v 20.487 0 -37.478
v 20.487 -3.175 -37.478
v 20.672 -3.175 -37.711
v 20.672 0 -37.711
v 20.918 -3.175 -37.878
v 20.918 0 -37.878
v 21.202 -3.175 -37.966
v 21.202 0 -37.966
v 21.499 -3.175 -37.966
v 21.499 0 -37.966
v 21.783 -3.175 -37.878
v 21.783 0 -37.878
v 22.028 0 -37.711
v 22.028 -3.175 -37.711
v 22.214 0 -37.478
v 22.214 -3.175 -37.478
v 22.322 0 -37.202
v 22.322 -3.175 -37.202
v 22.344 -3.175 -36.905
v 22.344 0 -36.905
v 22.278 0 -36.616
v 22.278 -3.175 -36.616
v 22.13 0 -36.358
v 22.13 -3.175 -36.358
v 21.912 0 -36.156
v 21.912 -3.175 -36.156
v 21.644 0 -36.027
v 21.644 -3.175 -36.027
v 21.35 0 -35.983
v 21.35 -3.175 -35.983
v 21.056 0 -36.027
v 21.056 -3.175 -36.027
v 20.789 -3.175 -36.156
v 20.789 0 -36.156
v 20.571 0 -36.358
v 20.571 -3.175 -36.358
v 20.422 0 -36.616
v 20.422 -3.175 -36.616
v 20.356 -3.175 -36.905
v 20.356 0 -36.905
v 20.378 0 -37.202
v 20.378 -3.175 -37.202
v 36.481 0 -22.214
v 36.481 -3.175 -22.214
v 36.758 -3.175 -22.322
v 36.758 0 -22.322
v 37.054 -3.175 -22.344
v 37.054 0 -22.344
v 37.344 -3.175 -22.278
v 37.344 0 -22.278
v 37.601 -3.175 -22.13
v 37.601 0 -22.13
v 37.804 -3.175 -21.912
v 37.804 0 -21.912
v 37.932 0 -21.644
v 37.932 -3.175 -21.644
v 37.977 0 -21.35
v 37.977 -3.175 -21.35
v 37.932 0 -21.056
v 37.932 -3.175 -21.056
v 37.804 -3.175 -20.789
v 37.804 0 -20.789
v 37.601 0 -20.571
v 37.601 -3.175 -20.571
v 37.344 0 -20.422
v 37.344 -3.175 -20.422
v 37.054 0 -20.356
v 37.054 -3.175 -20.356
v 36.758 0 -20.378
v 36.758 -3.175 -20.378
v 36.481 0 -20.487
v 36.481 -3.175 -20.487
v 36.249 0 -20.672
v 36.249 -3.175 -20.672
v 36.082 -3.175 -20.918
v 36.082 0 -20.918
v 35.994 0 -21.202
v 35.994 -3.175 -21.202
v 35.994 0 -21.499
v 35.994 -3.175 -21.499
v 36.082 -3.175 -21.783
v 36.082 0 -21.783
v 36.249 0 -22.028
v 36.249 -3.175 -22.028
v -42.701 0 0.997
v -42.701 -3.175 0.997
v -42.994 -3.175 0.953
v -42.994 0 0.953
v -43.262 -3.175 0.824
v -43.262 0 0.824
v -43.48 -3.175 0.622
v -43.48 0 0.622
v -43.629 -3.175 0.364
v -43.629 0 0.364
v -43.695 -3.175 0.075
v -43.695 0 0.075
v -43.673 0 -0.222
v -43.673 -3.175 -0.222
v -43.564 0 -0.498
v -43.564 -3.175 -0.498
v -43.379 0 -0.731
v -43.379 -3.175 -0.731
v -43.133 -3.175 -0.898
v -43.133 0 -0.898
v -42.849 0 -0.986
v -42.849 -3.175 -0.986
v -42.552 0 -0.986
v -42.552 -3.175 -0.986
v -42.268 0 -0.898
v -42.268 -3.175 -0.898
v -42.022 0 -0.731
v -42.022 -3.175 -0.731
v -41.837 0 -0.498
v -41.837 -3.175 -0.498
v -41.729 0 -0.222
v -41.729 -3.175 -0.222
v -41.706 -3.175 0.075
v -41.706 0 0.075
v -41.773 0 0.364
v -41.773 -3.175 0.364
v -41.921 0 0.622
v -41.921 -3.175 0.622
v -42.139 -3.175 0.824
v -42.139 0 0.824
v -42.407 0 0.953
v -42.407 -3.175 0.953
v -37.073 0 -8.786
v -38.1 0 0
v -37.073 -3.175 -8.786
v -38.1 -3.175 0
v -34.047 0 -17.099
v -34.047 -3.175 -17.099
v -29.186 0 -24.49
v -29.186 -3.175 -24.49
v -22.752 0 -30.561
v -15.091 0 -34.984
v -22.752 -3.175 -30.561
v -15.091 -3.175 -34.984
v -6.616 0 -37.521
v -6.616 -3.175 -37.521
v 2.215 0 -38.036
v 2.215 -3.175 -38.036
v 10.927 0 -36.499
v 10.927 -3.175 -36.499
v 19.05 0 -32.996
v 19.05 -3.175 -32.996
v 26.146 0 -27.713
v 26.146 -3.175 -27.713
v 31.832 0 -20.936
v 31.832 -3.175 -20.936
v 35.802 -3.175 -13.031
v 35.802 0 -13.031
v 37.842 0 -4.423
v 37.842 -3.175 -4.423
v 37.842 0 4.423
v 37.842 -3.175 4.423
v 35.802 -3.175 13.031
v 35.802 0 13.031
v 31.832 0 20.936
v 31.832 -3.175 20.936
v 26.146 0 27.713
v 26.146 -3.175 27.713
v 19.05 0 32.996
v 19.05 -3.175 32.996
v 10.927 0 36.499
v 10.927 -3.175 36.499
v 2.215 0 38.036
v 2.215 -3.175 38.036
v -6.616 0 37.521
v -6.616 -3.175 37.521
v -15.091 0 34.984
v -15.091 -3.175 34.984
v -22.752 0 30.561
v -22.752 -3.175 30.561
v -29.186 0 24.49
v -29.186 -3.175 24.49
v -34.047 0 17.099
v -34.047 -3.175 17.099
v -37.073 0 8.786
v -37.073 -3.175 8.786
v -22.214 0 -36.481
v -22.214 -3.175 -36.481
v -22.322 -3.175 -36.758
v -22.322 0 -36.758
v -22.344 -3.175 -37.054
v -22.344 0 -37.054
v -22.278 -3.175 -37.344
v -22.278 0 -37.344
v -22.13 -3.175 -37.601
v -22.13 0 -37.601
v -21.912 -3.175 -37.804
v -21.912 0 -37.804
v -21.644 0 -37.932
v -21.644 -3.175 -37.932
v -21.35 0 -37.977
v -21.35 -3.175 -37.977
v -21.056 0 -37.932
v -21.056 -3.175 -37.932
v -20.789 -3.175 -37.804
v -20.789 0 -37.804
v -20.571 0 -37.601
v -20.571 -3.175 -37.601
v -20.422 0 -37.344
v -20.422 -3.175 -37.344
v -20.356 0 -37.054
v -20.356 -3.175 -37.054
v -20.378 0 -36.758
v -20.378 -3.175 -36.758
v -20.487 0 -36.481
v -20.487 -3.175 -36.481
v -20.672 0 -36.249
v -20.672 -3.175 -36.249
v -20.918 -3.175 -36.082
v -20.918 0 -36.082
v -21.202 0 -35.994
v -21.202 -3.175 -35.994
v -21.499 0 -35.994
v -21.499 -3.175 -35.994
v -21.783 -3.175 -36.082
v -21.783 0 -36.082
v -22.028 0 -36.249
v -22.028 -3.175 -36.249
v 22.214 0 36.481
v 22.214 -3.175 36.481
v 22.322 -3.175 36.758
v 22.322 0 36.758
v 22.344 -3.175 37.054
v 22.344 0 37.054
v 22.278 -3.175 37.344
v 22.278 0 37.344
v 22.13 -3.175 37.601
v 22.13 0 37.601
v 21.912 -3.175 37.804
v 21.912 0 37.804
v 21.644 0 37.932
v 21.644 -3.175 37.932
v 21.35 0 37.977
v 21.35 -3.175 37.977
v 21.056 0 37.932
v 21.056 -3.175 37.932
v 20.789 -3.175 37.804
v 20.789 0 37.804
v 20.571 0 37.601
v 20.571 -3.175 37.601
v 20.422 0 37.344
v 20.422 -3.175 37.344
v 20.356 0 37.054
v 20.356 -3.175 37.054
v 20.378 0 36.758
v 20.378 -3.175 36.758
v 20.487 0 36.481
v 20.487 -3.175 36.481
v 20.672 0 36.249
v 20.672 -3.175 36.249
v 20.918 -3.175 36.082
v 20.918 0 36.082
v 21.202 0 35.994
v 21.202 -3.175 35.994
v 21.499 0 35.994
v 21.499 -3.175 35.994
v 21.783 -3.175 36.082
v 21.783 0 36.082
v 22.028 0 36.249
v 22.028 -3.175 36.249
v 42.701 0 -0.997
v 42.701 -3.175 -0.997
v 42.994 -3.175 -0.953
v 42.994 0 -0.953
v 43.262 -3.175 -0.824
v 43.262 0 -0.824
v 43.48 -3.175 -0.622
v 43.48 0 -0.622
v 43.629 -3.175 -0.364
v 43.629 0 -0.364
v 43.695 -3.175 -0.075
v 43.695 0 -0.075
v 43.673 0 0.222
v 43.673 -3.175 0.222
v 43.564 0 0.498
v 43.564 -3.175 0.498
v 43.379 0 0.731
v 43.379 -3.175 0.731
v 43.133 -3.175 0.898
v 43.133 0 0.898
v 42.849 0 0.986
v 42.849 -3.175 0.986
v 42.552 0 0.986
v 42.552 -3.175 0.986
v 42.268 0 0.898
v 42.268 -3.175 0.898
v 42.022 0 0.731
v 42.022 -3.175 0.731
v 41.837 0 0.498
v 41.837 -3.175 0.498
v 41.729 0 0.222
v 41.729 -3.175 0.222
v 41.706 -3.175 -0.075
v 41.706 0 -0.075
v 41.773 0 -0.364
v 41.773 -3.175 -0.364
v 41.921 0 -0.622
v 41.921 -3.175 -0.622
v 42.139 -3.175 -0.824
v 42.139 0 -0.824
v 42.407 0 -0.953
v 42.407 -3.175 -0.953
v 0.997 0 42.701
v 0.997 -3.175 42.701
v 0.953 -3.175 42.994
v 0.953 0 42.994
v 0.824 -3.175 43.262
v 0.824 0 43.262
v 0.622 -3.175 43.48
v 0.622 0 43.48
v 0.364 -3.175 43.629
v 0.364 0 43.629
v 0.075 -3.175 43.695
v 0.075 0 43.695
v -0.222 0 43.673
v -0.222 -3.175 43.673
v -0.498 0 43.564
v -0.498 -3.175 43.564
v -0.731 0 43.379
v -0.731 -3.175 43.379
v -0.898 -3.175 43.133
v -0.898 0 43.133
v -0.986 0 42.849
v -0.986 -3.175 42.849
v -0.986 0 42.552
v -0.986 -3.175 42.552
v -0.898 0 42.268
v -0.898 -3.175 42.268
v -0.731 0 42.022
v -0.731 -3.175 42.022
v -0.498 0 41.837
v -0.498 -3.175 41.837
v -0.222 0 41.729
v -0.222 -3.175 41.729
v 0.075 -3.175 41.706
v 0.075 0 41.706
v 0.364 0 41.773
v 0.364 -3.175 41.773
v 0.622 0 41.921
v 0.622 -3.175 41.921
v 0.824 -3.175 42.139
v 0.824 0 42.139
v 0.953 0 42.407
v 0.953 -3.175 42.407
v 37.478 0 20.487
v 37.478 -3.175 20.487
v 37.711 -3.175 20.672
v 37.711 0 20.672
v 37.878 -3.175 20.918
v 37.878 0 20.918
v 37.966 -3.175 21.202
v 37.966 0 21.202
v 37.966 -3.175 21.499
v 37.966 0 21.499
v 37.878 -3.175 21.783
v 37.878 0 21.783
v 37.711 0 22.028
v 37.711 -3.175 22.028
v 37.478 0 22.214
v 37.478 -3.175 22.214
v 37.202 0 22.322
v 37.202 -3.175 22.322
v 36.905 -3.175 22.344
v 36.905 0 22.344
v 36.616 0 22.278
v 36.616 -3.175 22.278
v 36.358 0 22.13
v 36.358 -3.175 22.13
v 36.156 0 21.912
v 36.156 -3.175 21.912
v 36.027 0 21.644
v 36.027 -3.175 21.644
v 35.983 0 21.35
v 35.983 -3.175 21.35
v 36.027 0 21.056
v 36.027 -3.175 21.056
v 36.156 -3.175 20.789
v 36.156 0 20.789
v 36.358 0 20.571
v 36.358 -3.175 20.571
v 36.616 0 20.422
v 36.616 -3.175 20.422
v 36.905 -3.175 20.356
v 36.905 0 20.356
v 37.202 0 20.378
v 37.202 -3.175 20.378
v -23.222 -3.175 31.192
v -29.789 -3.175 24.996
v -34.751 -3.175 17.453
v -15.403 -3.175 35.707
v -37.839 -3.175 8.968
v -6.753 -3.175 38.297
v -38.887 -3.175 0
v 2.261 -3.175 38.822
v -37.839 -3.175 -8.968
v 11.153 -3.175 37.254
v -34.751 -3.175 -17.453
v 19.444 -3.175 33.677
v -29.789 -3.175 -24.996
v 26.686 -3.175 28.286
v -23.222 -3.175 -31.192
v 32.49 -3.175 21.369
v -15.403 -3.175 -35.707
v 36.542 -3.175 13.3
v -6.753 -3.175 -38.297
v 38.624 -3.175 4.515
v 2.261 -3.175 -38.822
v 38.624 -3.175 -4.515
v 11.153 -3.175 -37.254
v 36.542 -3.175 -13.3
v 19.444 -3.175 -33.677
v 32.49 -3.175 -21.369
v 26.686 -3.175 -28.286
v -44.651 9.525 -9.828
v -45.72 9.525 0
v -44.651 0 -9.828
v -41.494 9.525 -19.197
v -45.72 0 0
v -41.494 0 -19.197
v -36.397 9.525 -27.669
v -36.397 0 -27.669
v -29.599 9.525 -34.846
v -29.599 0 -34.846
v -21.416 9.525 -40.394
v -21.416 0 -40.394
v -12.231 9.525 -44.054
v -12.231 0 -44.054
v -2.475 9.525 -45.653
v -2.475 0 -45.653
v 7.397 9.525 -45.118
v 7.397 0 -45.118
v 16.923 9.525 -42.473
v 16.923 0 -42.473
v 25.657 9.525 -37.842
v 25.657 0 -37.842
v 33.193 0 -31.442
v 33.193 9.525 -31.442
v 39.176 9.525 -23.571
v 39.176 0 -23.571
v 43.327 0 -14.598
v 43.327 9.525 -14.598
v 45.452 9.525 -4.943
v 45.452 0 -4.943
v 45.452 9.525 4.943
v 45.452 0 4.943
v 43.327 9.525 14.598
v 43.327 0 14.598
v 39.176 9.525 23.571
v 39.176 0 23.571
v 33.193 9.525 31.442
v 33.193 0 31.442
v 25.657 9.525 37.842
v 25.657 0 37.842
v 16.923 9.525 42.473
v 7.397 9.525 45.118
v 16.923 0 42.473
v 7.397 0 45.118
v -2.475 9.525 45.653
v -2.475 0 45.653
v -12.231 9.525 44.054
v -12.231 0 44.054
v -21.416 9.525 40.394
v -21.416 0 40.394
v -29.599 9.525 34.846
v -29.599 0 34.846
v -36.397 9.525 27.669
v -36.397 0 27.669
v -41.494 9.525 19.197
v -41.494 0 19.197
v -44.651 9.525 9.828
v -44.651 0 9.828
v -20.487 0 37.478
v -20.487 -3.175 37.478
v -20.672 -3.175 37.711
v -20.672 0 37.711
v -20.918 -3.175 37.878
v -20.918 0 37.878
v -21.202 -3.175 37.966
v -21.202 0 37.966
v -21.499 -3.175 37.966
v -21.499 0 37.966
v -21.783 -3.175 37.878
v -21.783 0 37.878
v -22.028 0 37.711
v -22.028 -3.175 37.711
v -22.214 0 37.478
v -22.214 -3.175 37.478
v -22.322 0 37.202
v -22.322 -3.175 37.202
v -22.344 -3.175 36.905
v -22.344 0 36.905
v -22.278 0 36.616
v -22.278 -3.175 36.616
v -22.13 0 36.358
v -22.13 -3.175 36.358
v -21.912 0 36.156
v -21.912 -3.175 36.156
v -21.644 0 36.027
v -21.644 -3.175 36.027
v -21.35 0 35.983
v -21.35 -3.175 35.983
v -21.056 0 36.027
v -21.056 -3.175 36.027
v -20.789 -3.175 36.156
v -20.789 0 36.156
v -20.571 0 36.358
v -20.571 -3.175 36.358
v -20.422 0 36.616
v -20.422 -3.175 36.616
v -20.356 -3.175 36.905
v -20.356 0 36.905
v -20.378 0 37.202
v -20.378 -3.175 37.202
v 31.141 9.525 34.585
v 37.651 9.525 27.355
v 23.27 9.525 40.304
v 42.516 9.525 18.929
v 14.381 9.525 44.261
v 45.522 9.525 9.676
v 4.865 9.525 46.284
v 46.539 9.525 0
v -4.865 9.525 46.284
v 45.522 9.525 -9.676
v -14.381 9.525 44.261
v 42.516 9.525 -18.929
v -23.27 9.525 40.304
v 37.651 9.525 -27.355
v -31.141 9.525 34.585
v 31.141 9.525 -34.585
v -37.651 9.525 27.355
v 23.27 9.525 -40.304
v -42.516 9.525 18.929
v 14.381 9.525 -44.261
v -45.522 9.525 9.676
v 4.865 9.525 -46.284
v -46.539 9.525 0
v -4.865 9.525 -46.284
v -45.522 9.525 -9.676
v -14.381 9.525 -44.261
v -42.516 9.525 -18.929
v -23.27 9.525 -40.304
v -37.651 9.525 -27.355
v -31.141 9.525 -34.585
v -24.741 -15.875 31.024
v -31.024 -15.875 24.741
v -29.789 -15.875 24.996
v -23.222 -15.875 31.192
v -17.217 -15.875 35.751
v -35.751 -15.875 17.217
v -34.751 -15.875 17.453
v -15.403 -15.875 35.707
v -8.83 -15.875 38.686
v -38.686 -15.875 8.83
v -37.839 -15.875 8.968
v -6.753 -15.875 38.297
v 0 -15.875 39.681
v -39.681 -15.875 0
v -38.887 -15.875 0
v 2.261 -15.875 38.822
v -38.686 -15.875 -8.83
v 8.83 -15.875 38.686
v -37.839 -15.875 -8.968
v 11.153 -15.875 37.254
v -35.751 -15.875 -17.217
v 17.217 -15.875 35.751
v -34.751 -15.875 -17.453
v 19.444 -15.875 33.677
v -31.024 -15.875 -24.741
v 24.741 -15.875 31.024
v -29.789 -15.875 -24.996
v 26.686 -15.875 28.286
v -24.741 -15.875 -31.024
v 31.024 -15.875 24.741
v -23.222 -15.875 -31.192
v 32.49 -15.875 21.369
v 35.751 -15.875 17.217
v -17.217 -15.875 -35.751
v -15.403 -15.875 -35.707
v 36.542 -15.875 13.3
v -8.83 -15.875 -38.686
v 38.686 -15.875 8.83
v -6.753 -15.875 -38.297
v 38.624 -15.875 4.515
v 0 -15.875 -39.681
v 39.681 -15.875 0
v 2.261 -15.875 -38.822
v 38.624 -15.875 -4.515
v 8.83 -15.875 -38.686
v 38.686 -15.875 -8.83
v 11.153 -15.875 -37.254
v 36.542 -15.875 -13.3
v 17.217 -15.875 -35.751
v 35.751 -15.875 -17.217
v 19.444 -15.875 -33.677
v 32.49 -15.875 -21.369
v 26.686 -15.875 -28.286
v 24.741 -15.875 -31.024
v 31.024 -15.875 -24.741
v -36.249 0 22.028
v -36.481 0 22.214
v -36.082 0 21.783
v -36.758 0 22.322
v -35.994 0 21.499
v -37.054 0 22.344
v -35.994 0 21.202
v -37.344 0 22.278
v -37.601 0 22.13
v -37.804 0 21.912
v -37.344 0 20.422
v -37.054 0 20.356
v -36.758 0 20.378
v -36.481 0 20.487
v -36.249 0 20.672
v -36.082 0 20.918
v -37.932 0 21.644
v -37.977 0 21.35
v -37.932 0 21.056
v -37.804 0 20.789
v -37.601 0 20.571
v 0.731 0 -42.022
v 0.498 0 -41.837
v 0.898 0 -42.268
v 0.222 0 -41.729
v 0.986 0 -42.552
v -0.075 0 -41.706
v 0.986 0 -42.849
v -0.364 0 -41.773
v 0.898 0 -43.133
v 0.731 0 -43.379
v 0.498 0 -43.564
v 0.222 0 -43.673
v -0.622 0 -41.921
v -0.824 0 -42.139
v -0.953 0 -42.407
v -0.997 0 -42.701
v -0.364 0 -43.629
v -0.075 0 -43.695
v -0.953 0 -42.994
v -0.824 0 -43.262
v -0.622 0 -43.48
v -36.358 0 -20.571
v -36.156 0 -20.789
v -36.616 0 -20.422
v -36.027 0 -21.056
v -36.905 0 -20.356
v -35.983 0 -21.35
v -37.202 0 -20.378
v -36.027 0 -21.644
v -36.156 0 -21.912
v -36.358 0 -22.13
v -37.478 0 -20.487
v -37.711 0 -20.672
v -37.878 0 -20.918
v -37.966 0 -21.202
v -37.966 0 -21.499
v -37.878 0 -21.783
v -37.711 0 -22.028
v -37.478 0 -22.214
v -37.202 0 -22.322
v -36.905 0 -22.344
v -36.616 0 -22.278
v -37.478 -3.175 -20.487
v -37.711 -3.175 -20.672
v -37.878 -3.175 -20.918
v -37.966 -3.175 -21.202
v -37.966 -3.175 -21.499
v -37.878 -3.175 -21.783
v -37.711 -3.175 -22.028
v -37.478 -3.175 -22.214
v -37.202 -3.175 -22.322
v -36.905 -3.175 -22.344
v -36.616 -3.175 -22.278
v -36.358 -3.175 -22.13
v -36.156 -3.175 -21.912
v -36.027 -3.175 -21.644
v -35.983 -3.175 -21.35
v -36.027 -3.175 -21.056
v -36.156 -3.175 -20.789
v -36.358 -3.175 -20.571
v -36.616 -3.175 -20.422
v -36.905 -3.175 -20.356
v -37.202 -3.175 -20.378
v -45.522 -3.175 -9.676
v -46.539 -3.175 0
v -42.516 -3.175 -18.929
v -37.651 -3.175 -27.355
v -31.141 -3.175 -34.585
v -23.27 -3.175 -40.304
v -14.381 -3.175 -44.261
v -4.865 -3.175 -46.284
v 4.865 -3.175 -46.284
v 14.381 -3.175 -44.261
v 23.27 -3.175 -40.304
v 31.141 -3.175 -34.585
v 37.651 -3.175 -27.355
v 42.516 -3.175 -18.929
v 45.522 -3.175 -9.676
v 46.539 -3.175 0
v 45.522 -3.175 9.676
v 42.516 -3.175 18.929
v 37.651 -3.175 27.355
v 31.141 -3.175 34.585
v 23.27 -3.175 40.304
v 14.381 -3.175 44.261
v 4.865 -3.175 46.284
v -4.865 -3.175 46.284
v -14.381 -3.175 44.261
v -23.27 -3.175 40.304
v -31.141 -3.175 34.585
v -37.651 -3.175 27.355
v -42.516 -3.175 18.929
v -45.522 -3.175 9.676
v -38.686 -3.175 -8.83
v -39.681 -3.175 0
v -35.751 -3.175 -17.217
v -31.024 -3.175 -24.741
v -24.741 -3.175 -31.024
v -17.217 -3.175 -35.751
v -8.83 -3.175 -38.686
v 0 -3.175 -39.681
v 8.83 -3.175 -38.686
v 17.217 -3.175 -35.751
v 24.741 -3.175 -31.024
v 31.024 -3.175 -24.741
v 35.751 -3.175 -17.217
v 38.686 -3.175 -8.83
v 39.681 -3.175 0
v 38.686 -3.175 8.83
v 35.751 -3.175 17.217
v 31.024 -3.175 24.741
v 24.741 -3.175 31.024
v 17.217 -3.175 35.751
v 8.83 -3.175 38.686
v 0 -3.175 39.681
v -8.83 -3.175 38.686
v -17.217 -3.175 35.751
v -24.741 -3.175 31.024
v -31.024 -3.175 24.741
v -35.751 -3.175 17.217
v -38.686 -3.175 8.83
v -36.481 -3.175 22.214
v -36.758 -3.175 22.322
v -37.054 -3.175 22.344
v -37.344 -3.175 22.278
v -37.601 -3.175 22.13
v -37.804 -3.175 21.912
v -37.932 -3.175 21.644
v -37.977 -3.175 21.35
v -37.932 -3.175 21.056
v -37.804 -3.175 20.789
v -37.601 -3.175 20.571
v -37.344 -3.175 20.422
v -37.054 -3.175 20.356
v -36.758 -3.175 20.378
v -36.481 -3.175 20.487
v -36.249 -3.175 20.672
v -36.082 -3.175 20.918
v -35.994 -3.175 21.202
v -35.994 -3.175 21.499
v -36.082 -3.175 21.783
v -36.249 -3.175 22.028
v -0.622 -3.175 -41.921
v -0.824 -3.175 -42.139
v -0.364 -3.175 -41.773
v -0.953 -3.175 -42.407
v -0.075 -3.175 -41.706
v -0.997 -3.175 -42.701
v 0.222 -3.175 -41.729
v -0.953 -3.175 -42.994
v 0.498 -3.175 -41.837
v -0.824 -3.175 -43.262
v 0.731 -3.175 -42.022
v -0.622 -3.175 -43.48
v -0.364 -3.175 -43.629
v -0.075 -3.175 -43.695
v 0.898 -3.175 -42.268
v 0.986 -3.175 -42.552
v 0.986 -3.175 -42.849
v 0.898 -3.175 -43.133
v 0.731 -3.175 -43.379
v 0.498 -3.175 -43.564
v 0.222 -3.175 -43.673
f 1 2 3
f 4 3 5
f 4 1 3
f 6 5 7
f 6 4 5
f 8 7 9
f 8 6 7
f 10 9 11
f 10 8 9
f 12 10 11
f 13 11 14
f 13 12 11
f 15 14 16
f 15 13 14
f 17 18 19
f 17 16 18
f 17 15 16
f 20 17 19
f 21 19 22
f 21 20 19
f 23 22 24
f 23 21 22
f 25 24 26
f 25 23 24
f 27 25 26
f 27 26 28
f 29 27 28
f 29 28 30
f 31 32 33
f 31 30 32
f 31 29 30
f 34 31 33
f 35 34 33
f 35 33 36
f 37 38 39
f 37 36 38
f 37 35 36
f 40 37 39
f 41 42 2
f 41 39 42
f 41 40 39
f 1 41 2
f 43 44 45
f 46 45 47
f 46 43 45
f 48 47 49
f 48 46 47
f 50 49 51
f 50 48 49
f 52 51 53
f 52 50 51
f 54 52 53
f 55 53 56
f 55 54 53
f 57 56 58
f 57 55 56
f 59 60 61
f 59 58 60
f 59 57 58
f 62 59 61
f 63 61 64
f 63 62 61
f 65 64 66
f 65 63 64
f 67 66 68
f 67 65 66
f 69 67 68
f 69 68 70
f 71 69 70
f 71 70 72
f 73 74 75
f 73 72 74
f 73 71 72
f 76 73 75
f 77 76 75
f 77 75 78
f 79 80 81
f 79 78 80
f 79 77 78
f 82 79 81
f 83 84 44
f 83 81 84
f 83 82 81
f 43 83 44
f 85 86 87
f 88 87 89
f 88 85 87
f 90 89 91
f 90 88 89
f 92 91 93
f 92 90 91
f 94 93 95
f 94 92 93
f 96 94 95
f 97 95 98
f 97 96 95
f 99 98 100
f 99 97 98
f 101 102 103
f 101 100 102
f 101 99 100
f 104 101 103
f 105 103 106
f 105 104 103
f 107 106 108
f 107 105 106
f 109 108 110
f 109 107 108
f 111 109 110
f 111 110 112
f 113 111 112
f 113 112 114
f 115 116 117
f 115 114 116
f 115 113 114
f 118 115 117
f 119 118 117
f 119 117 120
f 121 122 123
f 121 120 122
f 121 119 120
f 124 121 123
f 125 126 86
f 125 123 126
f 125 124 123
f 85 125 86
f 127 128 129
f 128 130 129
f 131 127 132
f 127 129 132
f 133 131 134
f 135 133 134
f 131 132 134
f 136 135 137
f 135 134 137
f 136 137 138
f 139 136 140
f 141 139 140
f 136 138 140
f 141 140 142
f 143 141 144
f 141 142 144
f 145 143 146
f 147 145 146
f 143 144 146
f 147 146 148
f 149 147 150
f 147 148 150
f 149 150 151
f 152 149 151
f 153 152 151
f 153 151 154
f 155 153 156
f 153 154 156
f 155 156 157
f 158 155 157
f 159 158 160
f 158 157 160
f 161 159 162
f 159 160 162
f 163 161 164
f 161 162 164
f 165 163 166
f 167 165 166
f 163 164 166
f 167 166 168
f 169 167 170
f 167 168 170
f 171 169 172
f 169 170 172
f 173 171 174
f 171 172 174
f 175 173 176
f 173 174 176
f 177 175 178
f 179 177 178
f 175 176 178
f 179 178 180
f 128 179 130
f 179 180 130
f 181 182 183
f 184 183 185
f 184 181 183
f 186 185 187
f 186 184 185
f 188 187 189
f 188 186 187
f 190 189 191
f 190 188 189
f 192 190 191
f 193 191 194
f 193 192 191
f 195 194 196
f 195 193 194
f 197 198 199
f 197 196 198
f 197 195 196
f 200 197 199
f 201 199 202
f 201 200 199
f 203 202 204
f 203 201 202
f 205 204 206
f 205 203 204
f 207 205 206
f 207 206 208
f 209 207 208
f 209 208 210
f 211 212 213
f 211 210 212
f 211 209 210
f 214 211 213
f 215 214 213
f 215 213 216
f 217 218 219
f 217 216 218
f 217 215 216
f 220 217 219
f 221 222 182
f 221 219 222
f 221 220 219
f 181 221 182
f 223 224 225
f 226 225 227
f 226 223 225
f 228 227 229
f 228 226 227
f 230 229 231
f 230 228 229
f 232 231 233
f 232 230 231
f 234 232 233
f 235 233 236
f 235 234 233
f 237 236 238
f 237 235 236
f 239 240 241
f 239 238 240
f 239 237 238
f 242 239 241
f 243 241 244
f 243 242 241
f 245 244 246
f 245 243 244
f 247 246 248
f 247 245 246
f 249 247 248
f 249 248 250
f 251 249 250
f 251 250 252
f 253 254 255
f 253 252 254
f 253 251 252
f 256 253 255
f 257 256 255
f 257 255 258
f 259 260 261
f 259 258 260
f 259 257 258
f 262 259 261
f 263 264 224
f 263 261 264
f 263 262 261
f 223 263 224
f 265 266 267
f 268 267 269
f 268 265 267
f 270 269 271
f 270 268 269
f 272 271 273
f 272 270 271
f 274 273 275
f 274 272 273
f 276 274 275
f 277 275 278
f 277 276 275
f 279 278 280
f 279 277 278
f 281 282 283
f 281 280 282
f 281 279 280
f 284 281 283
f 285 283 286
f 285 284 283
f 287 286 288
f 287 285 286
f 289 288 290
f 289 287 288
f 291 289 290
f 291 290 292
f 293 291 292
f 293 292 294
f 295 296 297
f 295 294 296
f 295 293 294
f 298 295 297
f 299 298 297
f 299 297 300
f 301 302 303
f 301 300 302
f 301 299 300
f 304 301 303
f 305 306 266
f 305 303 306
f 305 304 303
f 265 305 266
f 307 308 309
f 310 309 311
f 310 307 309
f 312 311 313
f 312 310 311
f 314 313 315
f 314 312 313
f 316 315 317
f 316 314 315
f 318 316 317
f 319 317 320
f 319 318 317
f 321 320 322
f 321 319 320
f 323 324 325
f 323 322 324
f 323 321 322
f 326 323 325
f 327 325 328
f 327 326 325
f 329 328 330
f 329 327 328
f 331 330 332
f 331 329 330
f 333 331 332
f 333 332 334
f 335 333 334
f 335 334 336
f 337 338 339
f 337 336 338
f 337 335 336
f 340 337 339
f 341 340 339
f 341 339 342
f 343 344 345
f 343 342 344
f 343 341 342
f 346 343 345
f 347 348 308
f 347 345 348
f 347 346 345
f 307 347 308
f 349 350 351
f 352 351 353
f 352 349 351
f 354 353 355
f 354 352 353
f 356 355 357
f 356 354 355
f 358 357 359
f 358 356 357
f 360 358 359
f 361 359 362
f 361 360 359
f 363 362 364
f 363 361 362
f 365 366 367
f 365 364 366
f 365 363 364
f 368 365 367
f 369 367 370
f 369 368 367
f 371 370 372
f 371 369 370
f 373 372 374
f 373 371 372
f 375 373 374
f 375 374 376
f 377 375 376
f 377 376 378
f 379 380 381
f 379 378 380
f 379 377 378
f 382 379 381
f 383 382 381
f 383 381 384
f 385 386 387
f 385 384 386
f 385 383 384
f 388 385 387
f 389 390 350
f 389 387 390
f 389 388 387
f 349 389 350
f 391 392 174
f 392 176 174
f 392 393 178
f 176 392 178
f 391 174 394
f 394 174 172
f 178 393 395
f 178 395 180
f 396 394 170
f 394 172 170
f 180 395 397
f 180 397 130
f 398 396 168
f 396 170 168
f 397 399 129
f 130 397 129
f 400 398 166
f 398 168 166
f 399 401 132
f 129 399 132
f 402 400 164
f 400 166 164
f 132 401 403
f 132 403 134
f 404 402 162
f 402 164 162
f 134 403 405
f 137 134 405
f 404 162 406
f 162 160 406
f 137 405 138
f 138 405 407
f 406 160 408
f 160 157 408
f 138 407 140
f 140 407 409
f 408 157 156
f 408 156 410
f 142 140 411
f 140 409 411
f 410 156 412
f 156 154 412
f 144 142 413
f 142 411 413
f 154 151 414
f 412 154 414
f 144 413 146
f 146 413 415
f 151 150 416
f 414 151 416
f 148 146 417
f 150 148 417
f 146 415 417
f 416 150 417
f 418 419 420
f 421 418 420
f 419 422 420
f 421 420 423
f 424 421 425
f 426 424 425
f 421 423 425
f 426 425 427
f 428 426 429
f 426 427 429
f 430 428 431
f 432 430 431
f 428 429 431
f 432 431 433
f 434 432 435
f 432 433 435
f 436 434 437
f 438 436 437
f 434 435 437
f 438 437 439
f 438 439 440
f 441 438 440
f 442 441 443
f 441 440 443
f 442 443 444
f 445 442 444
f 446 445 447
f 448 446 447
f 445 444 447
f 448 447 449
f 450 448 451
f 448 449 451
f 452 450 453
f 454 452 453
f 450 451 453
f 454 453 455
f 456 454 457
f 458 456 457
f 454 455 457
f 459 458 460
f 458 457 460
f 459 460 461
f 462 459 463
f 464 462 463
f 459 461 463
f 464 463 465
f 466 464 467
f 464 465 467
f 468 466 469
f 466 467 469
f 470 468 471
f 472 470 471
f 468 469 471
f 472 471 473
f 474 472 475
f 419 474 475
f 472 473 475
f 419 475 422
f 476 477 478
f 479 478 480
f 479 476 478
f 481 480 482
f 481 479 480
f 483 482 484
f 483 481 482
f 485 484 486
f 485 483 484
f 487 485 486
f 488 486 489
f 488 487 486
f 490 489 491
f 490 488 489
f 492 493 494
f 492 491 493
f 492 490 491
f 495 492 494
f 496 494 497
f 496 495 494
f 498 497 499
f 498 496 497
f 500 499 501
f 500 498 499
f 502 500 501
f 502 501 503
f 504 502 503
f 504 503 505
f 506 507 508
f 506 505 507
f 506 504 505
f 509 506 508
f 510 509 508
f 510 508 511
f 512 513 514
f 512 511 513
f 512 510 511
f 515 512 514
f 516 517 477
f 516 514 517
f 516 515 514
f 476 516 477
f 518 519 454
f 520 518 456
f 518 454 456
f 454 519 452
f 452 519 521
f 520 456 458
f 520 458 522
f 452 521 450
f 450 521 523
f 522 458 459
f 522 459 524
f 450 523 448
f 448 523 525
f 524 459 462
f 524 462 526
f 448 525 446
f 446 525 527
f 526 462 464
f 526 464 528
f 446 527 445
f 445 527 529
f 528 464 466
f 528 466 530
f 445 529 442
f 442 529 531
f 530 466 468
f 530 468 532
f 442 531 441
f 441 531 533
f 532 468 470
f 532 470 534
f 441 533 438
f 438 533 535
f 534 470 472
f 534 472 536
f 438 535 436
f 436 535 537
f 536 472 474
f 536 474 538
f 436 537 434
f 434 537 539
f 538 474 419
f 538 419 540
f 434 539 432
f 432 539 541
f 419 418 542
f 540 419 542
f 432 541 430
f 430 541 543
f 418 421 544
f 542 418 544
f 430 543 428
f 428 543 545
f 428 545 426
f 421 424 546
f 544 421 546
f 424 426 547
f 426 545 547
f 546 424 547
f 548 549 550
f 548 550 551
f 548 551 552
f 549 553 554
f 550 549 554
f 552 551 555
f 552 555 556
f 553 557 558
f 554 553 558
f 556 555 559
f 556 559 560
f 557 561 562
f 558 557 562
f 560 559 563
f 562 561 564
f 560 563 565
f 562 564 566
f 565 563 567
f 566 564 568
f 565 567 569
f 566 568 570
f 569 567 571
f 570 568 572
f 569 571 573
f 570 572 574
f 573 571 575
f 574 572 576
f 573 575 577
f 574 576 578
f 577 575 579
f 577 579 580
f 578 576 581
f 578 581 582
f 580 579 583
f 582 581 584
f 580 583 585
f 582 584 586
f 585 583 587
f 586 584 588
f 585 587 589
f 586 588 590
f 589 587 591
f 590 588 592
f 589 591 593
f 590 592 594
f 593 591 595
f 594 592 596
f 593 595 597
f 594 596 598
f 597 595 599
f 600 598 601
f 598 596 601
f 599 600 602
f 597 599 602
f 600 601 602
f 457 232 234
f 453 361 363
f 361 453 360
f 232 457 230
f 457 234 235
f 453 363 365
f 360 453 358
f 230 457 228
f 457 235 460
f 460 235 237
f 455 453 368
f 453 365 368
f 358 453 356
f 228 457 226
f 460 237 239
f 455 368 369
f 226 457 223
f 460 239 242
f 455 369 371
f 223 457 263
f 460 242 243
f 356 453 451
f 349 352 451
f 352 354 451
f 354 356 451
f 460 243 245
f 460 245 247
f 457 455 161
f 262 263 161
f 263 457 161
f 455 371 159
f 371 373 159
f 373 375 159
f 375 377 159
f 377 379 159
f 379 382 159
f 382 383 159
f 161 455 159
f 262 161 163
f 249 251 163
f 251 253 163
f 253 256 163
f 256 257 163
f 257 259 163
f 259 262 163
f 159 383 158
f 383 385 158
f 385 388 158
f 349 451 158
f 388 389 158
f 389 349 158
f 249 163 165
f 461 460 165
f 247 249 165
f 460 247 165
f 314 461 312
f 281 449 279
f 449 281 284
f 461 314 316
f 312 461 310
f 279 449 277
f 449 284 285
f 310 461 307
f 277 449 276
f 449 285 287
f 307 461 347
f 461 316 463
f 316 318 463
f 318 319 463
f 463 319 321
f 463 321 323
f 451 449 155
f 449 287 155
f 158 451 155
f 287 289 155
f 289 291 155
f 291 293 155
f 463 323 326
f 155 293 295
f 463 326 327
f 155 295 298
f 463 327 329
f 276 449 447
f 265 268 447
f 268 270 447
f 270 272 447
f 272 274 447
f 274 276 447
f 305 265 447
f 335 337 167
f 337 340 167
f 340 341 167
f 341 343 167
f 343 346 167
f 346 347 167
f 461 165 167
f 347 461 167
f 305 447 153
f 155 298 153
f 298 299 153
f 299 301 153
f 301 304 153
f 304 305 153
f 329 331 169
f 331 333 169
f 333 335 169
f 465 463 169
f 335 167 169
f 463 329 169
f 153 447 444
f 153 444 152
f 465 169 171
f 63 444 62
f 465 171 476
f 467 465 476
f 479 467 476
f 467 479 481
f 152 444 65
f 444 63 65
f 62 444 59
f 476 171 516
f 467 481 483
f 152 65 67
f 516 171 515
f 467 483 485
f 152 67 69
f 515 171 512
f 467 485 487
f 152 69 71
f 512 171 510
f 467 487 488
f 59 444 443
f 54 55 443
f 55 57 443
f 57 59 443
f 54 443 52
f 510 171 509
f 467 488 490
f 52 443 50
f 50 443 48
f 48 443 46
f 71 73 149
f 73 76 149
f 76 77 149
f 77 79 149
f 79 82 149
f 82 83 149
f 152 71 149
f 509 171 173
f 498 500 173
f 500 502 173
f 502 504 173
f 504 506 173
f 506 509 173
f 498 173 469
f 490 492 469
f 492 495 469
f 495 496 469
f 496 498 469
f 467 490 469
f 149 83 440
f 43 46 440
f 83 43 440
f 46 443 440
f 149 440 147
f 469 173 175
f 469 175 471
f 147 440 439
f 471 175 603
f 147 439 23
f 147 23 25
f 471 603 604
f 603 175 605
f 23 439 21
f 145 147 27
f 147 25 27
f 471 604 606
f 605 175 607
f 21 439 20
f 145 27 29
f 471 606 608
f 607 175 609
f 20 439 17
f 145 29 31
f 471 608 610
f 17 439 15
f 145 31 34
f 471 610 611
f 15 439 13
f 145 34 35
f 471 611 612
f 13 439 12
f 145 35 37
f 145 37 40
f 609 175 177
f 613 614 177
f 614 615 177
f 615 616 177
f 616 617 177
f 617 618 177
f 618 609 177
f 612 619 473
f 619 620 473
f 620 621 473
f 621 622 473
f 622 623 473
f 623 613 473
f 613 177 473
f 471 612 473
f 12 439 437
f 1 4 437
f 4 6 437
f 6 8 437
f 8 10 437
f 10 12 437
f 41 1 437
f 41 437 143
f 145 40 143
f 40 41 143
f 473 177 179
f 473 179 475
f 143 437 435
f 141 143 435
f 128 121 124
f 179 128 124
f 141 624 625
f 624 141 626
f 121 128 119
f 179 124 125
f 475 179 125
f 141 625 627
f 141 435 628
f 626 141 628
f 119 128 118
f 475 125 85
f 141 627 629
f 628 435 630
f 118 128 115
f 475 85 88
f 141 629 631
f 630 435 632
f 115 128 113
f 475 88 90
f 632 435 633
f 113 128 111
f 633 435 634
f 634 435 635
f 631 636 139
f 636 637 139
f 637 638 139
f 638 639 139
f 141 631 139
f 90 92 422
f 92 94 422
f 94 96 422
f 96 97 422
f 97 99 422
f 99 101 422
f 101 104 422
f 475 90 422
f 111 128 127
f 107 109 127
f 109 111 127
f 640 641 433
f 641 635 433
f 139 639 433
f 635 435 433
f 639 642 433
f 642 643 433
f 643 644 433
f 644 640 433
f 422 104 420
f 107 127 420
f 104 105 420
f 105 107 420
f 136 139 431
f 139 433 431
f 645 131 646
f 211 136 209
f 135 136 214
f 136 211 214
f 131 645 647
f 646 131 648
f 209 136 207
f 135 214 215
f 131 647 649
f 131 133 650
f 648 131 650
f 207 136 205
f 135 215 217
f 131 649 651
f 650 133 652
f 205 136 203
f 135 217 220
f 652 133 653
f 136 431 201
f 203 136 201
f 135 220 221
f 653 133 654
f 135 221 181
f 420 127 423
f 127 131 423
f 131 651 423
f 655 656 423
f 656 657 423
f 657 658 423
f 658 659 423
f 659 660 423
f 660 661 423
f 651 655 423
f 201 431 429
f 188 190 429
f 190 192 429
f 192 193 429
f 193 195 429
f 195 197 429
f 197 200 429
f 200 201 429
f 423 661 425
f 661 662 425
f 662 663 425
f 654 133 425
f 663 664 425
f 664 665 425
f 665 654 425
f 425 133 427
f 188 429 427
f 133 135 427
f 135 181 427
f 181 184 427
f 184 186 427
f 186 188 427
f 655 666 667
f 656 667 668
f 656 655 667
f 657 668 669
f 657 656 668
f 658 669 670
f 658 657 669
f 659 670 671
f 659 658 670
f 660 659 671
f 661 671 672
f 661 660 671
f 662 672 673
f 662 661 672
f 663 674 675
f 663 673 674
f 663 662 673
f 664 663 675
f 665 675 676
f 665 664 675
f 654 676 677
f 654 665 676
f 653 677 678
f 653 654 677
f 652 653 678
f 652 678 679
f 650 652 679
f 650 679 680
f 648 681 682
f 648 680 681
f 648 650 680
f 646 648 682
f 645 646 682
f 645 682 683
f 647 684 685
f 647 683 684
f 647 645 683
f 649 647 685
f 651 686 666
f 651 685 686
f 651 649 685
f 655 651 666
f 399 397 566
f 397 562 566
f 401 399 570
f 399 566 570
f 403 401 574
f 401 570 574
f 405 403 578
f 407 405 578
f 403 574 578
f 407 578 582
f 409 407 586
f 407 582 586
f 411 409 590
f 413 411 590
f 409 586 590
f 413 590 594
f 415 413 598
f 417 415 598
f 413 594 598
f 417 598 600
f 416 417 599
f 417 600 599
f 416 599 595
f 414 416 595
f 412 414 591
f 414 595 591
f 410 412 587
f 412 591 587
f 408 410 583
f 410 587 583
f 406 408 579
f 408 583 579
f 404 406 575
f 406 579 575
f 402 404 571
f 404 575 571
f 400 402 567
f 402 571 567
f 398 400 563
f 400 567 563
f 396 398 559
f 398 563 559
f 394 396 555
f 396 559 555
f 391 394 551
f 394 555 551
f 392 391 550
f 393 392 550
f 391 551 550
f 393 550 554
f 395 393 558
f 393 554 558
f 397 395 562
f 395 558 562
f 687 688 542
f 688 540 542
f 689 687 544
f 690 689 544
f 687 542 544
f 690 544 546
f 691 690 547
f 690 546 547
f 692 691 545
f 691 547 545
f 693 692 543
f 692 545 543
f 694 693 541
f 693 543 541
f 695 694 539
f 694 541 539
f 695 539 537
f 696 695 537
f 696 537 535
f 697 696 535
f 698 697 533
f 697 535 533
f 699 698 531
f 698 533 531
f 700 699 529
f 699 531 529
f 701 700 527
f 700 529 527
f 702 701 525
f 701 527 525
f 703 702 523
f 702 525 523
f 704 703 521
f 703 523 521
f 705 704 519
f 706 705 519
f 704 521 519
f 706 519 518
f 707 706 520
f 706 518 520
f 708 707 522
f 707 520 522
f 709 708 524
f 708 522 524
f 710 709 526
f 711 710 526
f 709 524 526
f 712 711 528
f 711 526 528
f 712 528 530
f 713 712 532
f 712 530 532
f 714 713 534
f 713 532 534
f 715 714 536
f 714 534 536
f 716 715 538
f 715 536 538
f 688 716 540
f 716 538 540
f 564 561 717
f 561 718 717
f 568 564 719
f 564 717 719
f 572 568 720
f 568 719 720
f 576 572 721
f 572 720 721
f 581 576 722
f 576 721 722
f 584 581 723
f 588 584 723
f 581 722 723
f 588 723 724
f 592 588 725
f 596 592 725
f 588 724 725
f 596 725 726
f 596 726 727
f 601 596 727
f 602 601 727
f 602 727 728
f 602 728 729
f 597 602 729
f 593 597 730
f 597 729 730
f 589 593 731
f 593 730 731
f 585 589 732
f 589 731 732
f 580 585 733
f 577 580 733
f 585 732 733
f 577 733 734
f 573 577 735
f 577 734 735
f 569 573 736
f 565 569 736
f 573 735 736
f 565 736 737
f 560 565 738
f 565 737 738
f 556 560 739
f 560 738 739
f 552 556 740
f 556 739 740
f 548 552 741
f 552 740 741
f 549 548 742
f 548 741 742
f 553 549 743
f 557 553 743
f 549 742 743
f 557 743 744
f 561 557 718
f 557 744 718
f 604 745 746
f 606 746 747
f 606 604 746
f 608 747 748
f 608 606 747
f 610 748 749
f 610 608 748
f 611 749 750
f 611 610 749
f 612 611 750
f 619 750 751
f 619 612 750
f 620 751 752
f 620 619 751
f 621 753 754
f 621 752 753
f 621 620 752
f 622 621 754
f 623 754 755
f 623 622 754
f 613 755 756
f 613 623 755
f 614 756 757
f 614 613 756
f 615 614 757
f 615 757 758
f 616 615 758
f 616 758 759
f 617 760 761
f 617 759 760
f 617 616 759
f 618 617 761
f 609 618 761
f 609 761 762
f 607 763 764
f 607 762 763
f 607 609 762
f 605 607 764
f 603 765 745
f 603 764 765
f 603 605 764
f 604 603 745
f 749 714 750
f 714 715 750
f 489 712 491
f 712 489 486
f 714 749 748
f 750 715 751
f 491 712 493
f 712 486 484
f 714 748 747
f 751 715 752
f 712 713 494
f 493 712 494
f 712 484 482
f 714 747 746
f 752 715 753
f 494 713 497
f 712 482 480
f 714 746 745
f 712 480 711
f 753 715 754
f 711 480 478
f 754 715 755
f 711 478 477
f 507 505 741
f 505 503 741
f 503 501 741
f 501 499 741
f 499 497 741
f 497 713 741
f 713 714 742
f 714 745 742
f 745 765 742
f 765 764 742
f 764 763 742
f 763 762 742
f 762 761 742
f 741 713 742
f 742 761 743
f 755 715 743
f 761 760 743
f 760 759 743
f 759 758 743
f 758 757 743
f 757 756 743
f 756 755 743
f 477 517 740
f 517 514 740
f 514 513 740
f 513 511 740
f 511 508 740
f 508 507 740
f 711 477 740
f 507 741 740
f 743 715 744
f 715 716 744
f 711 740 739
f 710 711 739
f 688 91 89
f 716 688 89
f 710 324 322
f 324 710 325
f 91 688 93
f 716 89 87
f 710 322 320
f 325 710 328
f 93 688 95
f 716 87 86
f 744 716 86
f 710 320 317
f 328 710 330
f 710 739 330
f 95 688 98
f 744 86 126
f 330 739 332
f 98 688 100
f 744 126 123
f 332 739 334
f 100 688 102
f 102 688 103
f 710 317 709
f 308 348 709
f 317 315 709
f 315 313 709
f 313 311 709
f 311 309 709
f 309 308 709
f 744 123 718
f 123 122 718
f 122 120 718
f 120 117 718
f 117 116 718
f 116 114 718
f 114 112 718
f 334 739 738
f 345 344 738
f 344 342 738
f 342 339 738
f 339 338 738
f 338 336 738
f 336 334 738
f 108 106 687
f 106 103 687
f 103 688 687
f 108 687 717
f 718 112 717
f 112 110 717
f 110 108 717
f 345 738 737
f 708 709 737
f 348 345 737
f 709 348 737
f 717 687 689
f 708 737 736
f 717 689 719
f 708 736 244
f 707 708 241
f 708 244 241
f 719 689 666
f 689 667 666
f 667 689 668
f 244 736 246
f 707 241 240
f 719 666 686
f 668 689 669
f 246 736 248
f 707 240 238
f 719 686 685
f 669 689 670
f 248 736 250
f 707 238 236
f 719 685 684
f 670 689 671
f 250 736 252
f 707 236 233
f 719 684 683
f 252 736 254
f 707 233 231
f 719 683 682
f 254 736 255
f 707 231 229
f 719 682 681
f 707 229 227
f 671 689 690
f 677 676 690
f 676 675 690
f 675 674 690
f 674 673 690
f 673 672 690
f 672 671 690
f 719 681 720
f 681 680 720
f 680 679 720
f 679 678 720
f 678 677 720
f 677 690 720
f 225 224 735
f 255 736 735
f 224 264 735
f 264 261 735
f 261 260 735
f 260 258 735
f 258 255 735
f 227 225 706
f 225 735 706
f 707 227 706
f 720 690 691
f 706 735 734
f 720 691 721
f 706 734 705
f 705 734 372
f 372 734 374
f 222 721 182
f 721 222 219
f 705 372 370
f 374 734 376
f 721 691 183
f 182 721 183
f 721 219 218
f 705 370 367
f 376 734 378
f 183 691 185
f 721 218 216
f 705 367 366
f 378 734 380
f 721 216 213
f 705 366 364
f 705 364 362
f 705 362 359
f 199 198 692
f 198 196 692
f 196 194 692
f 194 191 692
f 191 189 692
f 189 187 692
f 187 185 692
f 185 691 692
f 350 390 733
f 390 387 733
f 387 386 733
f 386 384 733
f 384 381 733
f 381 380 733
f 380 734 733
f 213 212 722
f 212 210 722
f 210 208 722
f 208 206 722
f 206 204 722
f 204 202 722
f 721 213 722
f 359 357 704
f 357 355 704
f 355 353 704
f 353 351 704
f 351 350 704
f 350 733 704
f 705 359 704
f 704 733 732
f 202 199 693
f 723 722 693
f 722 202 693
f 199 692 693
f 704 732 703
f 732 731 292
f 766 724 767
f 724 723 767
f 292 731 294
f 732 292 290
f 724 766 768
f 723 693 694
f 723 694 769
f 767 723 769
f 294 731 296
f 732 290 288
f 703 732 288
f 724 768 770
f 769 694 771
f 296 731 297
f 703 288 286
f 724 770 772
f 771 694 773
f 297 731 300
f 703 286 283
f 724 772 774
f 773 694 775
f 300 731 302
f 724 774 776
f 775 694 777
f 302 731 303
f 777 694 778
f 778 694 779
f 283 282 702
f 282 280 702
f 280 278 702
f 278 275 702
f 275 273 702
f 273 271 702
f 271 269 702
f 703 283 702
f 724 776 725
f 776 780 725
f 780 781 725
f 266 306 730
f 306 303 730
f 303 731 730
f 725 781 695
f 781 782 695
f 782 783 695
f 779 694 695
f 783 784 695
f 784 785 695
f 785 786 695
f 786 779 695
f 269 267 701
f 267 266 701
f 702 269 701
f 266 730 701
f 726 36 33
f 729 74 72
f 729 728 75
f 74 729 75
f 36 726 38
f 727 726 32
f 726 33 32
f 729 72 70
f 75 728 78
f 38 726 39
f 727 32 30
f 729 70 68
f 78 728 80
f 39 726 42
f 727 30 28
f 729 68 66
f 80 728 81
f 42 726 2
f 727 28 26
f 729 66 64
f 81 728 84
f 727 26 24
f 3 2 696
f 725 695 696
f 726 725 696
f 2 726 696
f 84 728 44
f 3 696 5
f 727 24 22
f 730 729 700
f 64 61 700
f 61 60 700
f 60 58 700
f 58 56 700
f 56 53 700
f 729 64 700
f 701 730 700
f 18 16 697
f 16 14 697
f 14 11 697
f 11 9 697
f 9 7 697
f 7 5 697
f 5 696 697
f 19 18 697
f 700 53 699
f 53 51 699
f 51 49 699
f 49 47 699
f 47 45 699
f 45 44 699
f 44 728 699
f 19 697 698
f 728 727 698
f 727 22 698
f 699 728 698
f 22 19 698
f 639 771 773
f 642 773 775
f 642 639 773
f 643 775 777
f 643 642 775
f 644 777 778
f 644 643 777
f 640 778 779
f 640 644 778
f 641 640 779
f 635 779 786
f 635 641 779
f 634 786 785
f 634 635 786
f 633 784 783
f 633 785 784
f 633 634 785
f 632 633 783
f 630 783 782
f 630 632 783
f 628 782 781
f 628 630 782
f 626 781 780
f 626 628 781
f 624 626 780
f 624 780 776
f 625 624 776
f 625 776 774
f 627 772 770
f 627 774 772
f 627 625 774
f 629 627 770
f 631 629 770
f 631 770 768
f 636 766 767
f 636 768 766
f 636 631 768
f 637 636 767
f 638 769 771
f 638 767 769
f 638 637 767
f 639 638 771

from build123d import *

# Parameters (mm, degrees)
SCREW_HOLES_COUNT = 12


with BuildPart() as part:
    # Cross Section → Main (revolve)
    with BuildSketch(Plane.XY):
        Polygon((-38.1, 0), (-38.1, -3.175), (-38.8874, -3.175), (-38.8874, -15.875), (-39.68115, -15.875), (-39.68115, -3.175), (-46.53915, -3.175), (-46.53915, 9.525), (-45.72, 9.525), (-45.72, 0), align=None)
    revolve(axis=Axis((0, 55, 0), (0, -1, 0)))

    # Sketch7 → #3-48 Tapped Hole1 (revolve, cut)
    with BuildSketch(Plane(origin=(-42.700575, 0, 0), x_dir=(0, 0, 1), z_dir=(1, 0, 0))):
        Polygon((0, 0), (0, 3.901027994), (0.99695, 3.302), (0.99695, 0), align=None)
    f_3_48_tapped_hole1 = revolve(axis=Axis((-42.700575, 6.35, 0), (0, -1, 0)), mode=Mode.SUBTRACT)

    # Screw Holes: #3-48 Tapped Hole1 ×12 about axis
    screw_holes_axis = Axis((0, 0, 0), (0, 1, 0))
    for i in range(1, SCREW_HOLES_COUNT):
        add(f_3_48_tapped_hole1.rotate(screw_holes_axis, i * 360 / SCREW_HOLES_COUNT), mode=Mode.SUBTRACT)


solid = part.part
